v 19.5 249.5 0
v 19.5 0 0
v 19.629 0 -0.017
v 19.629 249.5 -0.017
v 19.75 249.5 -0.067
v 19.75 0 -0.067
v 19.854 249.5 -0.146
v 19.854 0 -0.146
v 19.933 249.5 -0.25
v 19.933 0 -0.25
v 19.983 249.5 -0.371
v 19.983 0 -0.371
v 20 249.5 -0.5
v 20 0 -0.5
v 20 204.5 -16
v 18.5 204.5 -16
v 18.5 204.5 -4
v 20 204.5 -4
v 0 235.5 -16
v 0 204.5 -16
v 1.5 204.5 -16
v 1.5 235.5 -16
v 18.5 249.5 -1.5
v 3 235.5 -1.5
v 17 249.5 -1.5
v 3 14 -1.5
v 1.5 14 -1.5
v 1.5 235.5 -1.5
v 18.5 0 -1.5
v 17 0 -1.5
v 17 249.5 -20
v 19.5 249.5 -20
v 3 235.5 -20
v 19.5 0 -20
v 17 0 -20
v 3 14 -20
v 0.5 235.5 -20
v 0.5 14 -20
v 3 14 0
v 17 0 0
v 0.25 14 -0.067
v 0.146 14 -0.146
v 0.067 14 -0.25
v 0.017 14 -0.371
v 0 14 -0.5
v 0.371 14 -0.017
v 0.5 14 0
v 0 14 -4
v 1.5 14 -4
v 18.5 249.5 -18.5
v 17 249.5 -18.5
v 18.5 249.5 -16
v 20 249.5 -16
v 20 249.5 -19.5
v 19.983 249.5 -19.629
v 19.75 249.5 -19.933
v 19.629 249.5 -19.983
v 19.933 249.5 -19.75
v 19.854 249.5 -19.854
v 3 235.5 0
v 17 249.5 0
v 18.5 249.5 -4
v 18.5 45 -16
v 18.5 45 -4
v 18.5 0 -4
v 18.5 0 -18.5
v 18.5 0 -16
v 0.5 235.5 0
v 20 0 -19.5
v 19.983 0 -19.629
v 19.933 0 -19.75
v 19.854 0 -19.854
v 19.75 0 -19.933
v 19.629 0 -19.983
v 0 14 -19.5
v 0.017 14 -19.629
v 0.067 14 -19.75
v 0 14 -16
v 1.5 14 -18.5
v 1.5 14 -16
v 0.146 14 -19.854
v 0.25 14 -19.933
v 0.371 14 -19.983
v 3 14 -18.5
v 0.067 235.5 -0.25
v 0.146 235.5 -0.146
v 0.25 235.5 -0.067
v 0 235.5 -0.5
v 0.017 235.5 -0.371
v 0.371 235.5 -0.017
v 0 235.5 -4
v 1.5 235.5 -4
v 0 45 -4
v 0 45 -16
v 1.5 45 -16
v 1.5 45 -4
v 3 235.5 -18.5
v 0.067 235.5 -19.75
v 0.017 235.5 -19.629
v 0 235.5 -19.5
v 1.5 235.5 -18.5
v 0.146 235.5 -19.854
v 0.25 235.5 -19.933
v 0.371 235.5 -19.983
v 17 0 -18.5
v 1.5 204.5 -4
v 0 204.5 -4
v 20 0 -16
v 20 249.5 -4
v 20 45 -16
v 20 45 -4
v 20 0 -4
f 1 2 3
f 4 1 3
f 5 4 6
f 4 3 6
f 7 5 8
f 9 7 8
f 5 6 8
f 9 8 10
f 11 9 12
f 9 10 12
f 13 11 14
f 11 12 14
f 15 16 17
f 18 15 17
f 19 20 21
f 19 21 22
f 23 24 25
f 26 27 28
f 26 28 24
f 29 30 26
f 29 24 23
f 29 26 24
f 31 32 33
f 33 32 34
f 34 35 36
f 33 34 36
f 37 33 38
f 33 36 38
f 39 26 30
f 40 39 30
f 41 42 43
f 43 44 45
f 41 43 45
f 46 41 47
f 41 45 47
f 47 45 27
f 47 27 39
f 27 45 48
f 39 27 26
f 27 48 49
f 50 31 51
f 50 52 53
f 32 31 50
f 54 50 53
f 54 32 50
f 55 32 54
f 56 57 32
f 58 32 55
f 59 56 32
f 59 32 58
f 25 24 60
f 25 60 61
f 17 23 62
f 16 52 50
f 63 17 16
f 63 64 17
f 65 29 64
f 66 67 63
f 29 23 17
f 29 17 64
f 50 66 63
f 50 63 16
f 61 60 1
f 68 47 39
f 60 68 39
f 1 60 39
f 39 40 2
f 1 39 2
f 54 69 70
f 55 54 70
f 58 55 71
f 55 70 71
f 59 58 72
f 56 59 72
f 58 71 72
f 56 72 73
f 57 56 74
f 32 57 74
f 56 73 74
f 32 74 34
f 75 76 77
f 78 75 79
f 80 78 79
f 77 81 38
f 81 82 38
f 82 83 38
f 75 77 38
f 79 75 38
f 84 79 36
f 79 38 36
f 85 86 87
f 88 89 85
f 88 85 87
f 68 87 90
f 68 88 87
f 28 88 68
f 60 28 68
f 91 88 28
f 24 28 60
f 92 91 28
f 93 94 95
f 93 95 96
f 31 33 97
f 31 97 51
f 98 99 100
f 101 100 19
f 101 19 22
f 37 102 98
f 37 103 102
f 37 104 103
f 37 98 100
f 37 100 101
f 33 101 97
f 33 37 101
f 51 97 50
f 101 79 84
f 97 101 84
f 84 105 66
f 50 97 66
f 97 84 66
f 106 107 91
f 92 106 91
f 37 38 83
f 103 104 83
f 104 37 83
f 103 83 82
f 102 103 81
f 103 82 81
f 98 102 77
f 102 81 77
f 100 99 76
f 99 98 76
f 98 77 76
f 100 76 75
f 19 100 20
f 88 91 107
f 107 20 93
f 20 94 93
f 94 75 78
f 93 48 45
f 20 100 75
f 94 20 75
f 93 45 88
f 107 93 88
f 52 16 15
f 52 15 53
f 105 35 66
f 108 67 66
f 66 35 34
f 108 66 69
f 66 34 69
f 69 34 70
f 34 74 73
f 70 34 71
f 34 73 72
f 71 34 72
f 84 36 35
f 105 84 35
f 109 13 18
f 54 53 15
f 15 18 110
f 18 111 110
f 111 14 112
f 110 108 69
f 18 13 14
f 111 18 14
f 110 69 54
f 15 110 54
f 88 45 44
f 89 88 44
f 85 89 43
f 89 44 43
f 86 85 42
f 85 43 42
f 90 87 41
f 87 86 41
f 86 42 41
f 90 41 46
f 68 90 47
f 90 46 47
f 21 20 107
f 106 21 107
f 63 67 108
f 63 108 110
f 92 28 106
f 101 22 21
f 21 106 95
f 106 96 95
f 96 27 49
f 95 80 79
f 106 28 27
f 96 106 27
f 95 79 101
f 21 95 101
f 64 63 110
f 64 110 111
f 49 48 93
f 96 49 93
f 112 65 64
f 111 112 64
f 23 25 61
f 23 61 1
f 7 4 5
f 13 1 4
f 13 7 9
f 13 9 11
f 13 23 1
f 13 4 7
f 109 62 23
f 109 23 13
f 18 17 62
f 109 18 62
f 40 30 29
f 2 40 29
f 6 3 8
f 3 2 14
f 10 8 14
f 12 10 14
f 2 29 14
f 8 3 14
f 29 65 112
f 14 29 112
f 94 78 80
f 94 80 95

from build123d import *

# Parameters (mm, degrees)
SKETCH1_W           = 17
SKETCH1_H           = 17
BOSS_EXTRUDE1_DEPTH = 249.5
SKETCH2_W           = 12
SKETCH2_H           = 45
CUT_EXTRUDE1_DEPTH  = 252.098088404
CUT_EXTRUDE2_DEPTH  = 252.098088404


with BuildPart() as part:
    # Sketch1 → Boss-Extrude1 (new body)
    with BuildSketch(Plane(origin=(0, 0, 0), x_dir=(1, 0, 0), z_dir=(0, 1, 0))):
        with BuildLine():
            Line((0.5, 0), (19.5, 0))
            ThreePointArc((19.5, 0), (19.853553391, 0.146446609), (20, 0.5))
            Line((20, 0.5), (20, 19.5))
            ThreePointArc((20, 19.5), (19.853553391, 19.853553391), (19.5, 20))
            Line((19.5, 20), (0.5, 20))
            ThreePointArc((0.5, 20), (0.146446609, 19.853553391), (0, 19.5))
            Line((0, 19.5), (0, 0.5))
            ThreePointArc((0, 0.5), (0.146446609, 0.146446609), (0.5, 0))
        make_face()
        with Locations((10, 10)):
            Rectangle(SKETCH1_W, SKETCH1_H, mode=Mode.SUBTRACT)
    extrude(amount=BOSS_EXTRUDE1_DEPTH)

    # Sketch2 → Cut-Extrude1 (cut, through all)
    with BuildSketch(Plane.ZY):
        with Locations((-10, 22.5)):
            Rectangle(SKETCH2_W, SKETCH2_H)
        with Locations((-10, 227)):
            Rectangle(SKETCH2_W, SKETCH2_H)
    extrude(amount=-CUT_EXTRUDE1_DEPTH, mode=Mode.SUBTRACT)

    # Sketch3 → Cut-Extrude2 (cut, through all)
    with BuildSketch(Plane(origin=(0, 0, -20), x_dir=(-1, 0, 0), z_dir=(0, 0, -1))):
        Polygon((0, 235.5), (-3, 235.5), (-17, 249.5), (0, 249.5), align=None)
        Polygon((-17, 0), (0, 0), (0, 14), (-3, 14), align=None)
    extrude(amount=-CUT_EXTRUDE2_DEPTH, mode=Mode.SUBTRACT)


solid = part.part
